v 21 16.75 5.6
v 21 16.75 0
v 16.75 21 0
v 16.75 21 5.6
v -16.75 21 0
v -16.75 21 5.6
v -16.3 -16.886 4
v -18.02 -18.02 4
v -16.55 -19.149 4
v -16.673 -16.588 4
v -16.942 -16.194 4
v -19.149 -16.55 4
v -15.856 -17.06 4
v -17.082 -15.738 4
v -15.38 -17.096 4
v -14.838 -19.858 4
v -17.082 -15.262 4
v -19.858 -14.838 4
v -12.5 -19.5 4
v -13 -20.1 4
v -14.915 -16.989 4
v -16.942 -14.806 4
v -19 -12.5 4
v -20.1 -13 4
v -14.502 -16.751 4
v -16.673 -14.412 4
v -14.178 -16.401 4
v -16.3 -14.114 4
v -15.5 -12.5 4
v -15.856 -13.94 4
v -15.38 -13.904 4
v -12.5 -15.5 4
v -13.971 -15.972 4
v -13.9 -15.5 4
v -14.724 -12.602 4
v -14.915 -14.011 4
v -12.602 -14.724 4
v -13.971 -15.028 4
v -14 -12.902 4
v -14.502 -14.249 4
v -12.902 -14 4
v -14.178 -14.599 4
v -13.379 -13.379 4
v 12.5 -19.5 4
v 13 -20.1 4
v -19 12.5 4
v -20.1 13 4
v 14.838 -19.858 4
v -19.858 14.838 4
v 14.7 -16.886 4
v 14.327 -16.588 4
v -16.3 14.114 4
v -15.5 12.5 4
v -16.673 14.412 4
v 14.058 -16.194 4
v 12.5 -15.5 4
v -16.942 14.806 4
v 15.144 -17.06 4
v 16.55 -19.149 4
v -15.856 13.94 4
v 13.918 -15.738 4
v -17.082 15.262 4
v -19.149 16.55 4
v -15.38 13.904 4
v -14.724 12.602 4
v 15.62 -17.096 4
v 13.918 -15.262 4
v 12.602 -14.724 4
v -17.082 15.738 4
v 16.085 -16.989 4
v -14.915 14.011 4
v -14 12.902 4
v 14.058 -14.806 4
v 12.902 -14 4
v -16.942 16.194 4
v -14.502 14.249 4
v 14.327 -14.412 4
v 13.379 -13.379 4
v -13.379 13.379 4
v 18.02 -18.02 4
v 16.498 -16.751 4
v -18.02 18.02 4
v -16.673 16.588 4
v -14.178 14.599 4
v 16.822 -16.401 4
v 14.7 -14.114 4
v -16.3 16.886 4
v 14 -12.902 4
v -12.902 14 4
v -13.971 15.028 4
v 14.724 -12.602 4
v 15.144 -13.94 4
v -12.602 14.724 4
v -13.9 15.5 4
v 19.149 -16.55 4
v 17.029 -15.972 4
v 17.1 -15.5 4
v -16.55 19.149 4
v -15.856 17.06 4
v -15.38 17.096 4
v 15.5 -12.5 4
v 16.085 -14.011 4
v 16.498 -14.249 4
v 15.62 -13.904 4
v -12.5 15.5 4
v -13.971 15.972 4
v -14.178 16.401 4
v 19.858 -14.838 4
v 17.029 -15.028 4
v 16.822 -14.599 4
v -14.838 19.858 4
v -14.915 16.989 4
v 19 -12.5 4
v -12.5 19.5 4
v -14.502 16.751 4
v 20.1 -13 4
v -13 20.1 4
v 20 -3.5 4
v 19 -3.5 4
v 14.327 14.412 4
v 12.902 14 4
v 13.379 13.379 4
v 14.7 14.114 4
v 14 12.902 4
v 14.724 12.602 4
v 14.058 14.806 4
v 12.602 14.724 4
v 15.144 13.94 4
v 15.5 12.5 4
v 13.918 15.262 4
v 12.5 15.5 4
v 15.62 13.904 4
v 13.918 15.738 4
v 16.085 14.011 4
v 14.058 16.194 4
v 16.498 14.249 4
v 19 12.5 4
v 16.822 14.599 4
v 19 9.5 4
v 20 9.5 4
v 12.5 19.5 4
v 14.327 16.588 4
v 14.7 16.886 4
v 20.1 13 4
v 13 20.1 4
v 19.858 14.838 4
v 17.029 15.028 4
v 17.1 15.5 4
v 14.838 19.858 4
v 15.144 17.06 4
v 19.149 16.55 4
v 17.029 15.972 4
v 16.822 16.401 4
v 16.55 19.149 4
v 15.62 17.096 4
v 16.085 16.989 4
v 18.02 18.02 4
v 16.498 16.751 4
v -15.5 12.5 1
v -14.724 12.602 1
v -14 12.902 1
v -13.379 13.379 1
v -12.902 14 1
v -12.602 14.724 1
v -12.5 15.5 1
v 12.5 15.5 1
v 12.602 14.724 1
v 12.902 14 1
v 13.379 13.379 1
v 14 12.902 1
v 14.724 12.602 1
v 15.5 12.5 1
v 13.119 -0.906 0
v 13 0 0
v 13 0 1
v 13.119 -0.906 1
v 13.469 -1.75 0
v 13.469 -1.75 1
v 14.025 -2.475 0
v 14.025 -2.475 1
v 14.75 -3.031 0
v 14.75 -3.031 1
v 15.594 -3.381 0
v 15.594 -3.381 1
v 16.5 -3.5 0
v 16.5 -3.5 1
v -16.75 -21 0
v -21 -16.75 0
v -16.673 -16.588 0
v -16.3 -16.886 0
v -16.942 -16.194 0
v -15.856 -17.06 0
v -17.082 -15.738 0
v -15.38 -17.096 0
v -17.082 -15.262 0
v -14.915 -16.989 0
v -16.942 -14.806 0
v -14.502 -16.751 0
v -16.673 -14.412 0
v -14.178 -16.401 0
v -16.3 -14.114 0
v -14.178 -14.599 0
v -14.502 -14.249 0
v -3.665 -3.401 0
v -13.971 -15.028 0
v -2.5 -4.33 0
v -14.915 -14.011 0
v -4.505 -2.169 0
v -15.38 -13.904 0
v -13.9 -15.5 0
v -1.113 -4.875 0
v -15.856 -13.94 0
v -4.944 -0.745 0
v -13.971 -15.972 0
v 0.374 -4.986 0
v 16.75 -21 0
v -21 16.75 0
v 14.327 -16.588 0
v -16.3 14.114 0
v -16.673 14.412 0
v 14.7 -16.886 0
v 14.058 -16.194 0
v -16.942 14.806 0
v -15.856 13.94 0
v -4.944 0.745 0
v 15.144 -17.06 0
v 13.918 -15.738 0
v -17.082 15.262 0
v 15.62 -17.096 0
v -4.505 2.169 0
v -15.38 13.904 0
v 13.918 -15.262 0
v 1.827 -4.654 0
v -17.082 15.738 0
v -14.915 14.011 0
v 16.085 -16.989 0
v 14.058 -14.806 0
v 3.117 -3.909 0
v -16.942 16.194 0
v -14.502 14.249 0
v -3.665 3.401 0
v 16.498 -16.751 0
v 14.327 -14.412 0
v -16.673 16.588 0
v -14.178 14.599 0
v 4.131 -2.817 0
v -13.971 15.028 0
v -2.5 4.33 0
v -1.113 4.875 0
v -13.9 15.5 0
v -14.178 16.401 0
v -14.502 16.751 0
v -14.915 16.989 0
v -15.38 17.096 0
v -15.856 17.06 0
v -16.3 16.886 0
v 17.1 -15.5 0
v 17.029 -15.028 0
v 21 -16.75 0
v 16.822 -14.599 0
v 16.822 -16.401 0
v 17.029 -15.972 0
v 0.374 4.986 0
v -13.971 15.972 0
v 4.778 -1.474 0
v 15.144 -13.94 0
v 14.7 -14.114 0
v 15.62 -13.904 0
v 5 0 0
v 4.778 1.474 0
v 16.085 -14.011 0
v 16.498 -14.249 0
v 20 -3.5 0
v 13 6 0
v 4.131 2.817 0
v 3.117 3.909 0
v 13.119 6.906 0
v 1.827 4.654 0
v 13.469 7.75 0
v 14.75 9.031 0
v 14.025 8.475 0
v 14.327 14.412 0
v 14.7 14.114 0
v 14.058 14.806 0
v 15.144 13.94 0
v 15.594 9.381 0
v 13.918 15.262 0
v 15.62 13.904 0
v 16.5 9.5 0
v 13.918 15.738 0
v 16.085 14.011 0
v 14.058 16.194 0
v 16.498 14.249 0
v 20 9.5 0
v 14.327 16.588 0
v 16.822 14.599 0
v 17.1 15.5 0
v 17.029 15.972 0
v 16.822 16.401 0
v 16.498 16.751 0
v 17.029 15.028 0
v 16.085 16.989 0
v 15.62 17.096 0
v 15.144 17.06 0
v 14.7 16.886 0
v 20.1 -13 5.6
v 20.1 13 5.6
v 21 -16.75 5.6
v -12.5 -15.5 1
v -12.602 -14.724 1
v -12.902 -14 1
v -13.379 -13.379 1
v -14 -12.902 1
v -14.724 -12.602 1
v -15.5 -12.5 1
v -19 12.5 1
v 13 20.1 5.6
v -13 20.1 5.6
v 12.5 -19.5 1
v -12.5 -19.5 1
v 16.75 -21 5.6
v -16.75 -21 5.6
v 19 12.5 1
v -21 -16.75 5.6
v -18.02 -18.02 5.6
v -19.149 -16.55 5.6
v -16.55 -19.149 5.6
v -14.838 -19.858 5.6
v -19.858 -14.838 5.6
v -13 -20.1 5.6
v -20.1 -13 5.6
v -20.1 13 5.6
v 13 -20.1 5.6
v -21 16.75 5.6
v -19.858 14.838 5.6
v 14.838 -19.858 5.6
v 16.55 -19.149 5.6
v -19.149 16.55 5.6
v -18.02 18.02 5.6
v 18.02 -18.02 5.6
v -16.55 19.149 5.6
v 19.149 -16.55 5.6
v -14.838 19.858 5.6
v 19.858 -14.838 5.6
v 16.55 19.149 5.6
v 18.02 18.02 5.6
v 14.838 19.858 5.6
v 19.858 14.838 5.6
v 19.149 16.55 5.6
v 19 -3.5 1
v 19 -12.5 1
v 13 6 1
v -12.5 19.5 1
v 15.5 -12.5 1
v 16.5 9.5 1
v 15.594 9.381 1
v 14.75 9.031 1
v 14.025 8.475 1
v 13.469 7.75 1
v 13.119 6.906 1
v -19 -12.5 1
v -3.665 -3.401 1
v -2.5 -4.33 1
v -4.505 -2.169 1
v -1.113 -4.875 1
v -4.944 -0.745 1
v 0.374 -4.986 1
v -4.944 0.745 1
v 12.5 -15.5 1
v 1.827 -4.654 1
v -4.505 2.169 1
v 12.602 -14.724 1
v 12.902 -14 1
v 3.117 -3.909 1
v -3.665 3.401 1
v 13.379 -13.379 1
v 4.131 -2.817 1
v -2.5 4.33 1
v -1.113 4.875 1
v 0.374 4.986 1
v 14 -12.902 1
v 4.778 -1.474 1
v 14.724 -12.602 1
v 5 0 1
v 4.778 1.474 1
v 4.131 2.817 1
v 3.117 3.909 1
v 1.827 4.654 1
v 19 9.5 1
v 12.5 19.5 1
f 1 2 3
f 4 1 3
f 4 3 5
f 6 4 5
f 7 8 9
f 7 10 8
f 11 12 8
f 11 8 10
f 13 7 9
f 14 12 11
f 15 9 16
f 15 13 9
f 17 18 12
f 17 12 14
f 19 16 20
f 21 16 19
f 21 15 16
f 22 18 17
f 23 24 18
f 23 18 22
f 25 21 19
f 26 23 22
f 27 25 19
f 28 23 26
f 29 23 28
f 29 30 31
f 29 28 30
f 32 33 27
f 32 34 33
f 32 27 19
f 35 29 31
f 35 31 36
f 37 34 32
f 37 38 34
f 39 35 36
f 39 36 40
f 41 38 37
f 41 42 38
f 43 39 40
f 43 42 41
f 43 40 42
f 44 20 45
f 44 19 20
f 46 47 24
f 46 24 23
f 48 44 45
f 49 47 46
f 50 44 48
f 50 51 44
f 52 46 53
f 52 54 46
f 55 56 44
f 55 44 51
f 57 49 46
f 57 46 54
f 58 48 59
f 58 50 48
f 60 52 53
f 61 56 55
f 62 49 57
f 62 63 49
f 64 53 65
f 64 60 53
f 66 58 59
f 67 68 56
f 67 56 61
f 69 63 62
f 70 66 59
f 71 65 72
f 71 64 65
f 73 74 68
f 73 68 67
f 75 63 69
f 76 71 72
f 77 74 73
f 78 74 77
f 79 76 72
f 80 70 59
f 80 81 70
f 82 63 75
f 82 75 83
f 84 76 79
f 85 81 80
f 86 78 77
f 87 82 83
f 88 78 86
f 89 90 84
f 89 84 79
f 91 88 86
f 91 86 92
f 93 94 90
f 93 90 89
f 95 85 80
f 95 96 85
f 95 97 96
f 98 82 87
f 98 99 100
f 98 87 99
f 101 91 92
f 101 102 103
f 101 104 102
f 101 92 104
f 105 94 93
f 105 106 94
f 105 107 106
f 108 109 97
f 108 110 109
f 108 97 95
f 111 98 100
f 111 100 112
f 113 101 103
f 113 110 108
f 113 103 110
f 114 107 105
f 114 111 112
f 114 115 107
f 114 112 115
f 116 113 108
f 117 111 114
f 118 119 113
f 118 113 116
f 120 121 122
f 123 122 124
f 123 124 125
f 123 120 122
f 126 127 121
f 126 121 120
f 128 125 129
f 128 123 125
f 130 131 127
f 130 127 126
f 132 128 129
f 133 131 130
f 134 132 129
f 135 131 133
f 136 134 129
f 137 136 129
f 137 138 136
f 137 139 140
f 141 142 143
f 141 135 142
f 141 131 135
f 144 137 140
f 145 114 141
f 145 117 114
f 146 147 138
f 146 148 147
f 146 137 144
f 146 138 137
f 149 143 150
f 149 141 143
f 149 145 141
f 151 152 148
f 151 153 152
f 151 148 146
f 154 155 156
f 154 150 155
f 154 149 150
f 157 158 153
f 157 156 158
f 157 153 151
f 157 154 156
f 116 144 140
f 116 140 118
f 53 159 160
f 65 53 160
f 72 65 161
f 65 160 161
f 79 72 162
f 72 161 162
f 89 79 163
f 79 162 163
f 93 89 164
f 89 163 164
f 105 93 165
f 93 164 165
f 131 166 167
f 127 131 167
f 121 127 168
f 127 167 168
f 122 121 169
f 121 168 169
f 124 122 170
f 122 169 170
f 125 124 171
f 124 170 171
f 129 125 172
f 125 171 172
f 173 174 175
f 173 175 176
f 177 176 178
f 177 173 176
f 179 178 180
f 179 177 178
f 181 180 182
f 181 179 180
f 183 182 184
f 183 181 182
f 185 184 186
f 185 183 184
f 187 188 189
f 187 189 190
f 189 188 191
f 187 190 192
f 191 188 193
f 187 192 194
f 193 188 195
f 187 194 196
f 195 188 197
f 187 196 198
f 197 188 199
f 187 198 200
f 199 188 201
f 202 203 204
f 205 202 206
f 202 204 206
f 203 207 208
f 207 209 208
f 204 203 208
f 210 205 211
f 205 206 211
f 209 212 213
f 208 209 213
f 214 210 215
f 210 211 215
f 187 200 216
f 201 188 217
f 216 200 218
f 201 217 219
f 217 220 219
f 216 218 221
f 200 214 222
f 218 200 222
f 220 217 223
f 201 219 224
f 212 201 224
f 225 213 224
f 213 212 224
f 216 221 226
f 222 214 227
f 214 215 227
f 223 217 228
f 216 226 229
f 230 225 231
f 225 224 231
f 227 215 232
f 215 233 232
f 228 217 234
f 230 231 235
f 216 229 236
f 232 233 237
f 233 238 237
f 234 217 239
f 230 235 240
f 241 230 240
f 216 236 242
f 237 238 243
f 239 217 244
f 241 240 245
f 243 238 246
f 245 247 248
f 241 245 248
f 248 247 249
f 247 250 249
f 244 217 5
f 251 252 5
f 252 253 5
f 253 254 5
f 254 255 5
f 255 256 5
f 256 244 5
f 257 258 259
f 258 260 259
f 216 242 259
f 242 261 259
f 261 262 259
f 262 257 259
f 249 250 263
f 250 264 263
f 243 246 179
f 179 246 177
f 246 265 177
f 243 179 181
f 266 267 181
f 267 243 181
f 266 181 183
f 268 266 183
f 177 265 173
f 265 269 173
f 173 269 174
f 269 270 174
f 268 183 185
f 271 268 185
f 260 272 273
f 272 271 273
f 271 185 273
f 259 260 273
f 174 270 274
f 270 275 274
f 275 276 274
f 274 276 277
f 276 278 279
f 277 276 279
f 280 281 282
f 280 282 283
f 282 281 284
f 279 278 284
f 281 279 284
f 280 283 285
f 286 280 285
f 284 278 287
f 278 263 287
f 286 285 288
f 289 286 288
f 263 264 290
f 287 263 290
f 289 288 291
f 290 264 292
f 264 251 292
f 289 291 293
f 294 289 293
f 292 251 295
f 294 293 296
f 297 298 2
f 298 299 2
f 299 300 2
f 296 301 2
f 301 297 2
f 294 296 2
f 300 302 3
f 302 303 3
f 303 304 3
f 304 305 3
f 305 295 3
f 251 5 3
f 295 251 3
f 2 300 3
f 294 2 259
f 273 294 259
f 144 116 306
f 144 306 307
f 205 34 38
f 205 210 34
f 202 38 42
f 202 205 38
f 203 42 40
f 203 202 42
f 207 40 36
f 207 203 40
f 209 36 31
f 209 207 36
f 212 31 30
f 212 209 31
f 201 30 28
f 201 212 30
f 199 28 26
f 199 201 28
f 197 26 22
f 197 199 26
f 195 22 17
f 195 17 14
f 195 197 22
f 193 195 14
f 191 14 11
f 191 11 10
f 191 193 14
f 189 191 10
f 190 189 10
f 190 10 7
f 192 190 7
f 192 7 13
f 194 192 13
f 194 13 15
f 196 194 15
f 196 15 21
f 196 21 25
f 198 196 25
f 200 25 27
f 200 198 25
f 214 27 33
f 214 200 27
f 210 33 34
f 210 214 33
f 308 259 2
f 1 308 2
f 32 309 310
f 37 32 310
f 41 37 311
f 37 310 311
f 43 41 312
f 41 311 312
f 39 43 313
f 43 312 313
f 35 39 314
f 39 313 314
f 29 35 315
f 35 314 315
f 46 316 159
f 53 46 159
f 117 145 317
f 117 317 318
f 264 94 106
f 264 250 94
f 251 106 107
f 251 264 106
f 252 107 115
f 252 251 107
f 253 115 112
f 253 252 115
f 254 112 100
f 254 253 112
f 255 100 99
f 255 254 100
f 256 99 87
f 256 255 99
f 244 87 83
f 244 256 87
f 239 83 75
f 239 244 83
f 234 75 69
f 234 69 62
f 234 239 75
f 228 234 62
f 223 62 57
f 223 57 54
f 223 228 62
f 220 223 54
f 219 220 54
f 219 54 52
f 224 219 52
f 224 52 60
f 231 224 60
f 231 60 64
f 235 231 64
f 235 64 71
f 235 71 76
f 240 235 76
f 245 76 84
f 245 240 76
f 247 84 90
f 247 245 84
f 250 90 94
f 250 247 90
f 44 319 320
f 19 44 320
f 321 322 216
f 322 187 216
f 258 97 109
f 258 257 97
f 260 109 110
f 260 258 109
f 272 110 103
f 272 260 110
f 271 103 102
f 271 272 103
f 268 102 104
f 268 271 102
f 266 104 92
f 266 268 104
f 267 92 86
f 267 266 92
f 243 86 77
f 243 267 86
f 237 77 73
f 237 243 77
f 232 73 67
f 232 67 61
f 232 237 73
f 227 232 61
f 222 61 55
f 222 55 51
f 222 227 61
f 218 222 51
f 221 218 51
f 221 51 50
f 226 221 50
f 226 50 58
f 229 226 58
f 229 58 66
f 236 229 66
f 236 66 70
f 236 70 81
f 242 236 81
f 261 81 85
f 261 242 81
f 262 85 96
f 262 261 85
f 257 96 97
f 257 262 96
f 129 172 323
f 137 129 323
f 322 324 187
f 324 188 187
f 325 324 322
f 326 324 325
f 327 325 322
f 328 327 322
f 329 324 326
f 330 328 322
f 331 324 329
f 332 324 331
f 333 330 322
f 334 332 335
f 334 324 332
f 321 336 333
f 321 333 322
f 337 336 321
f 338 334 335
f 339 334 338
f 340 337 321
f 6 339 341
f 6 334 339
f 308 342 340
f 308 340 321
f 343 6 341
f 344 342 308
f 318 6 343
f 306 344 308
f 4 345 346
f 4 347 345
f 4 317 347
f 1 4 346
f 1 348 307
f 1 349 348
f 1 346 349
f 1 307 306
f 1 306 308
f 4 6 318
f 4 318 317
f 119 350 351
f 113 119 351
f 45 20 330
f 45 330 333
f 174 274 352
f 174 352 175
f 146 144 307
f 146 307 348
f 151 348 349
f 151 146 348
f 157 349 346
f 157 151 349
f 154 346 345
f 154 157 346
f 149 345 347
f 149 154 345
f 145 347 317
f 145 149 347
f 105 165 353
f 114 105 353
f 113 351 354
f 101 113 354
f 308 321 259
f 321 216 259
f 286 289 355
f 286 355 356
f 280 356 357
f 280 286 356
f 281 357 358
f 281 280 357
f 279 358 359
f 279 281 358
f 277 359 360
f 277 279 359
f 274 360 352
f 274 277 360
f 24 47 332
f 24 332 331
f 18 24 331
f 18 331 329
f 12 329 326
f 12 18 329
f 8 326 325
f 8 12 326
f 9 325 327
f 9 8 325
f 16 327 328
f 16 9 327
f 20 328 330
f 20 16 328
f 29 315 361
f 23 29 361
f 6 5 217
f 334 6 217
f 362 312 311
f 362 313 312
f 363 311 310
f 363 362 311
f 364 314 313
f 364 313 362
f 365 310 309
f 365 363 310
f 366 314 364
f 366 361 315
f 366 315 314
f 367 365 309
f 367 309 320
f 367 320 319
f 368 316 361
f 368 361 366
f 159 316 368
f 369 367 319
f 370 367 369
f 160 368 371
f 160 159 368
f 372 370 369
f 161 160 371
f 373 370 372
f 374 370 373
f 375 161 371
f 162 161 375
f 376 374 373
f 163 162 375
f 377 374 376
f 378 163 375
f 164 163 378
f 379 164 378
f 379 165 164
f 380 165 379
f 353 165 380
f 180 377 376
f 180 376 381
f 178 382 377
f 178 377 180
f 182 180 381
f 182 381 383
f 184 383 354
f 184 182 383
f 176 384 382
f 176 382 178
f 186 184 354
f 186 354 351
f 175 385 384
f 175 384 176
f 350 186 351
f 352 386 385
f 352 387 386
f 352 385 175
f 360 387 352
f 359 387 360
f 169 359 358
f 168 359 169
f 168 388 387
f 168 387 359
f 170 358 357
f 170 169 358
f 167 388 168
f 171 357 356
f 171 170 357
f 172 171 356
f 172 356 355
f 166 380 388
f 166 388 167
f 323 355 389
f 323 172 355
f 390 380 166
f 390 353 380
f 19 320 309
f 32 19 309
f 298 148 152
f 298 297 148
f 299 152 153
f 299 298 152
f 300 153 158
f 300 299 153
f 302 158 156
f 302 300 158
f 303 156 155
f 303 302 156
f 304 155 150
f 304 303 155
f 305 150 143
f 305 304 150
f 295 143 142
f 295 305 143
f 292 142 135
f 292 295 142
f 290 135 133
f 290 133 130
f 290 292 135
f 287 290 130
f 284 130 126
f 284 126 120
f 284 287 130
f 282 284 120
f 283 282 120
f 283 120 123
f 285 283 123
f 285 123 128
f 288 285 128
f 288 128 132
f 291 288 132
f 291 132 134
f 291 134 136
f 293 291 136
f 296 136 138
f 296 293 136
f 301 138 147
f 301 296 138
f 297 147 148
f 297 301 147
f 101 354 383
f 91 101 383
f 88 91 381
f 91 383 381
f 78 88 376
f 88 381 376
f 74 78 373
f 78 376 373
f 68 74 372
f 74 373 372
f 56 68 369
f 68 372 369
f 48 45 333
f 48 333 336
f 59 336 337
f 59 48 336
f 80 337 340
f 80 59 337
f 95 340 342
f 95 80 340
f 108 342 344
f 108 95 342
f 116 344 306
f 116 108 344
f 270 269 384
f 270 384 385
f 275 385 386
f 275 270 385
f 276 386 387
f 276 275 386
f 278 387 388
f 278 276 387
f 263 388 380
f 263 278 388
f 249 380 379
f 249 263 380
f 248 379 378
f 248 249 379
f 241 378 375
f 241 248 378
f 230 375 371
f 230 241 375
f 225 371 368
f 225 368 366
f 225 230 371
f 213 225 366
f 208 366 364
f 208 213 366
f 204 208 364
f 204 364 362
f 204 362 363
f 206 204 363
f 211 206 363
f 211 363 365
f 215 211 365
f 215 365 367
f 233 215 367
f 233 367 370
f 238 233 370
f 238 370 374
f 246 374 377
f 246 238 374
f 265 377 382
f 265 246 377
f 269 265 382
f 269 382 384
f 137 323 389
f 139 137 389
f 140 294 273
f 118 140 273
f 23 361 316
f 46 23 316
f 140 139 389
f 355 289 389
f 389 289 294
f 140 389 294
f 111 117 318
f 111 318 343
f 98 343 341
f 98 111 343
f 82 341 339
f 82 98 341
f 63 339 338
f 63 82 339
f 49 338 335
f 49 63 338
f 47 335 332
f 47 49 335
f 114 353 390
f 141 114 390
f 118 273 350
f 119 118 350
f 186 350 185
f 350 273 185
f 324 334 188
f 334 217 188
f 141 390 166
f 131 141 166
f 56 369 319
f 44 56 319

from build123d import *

# Parameters (mm, degrees)
SKETCH_1_R      = 5
SKETCH_1_R_2    = 1.6
EXTRUDE_3_DEPTH = 1
SKETCH_3_R      = 1.6
EXTRUDE_4_DEPTH = 3
EXTRUDE_5_DEPTH = 1.6


with BuildPart() as part:
    # 草图1 → 凸台-拉伸3 (new body)
    with BuildSketch(Plane.XY):
        Polygon((-21, 16.75), (-21, -16.75), (-16.75, -21), (16.75, -21), (21, -16.75), (21, 16.75), (16.75, 21), (-16.75, 21), align=None)
        Circle(SKETCH_1_R, mode=Mode.SUBTRACT)
        with Locations((-15.5, 15.5)):
            Circle(SKETCH_1_R_2, mode=Mode.SUBTRACT)
        with Locations((15.5, 15.5)):
            Circle(SKETCH_1_R_2, mode=Mode.SUBTRACT)
        with Locations((-15.5, -15.5)):
            Circle(SKETCH_1_R_2, mode=Mode.SUBTRACT)
        with Locations((15.5, -15.5)):
            Circle(SKETCH_1_R_2, mode=Mode.SUBTRACT)
        with BuildLine():
            Line((13, 6), (13, 0))
            ThreePointArc((13, 0), (14.025126266, -2.474873734), (16.5, -3.5))
            Line((16.5, -3.5), (20, -3.5))
            Line((20, -3.5), (20, 9.5))
            Line((20, 9.5), (16.5, 9.5))
            ThreePointArc((16.5, 9.5), (14.025126266, 8.474873734), (13, 6))
        make_face(mode=Mode.SUBTRACT)
    extrude(amount=EXTRUDE_3_DEPTH)

    # 草图3 → 凸台-拉伸4 (add)
    with BuildSketch(Plane.XY.offset(1)):
        Polygon((-16.75, 21), (-21, 16.75), (-21, -16.75), (-16.75, -21), (16.75, -21), (21, -16.75), (21, 16.75), (16.75, 21), align=None)
        with Locations((-15.5, 15.5)):
            Circle(SKETCH_3_R, mode=Mode.SUBTRACT)
        with Locations((15.5, 15.5)):
            Circle(SKETCH_3_R, mode=Mode.SUBTRACT)
        with Locations((-15.5, -15.5)):
            Circle(SKETCH_3_R, mode=Mode.SUBTRACT)
        with Locations((15.5, -15.5)):
            Circle(SKETCH_3_R, mode=Mode.SUBTRACT)
        with BuildLine():
            Line((-12.5, 15.5), (-12.5, 19.5))
            Line((-12.5, 19.5), (12.5, 19.5))
            Line((12.5, 19.5), (12.5, 15.5))
            ThreePointArc((12.5, 15.5), (13.378679656, 13.378679656), (15.5, 12.5))
            Line((15.5, 12.5), (19, 12.5))
            Line((19, 12.5), (19, 9.5))
            Line((19, 9.5), (20, 9.5))
            Line((20, 9.5), (20, -3.5))
            Line((20, -3.5), (19, -3.5))
            Line((19, -3.5), (19, -12.5))
            Line((19, -12.5), (15.5, -12.5))
            ThreePointArc((15.5, -12.5), (13.378679656, -13.378679656), (12.5, -15.5))
            Line((12.5, -15.5), (12.5, -19.5))
            Line((12.5, -19.5), (-12.5, -19.5))
            Line((-12.5, -19.5), (-12.5, -15.5))
            ThreePointArc((-12.5, -15.5), (-13.378679656, -13.378679656), (-15.5, -12.5))
            Line((-15.5, -12.5), (-19, -12.5))
            Line((-19, -12.5), (-19, 12.5))
            Line((-19, 12.5), (-15.5, 12.5))
            ThreePointArc((-15.5, 12.5), (-13.378679656, 13.378679656), (-12.5, 15.5))
        make_face(mode=Mode.SUBTRACT)
    extrude(amount=EXTRUDE_4_DEPTH)

    # 草图4 → 凸台-拉伸5 (add)
    with BuildSketch(Plane.XY.offset(4)):
        Polygon((-16.75, 21), (-21, 16.75), (-21, -16.75), (-16.75, -21), (16.75, -21), (21, -16.75), (21, 16.75), (16.75, 21), align=None)
        with BuildLine():
            Line((-20.1, 13), (-20.1, -13))
            ThreePointArc((-20.1, -13), (-18.020458146, -18.020458146), (-13, -20.1))
            Line((-13, -20.1), (13, -20.1))
            ThreePointArc((13, -20.1), (18.020458146, -18.020458146), (20.1, -13))
            Line((20.1, -13), (20.1, 13))
            ThreePointArc((20.1, 13), (18.020458146, 18.020458146), (13, 20.1))
            Line((13, 20.1), (-13, 20.1))
            ThreePointArc((-13, 20.1), (-18.020458146, 18.020458146), (-20.1, 13))
        make_face(mode=Mode.SUBTRACT)
    extrude(amount=EXTRUDE_5_DEPTH)


solid = part.part
